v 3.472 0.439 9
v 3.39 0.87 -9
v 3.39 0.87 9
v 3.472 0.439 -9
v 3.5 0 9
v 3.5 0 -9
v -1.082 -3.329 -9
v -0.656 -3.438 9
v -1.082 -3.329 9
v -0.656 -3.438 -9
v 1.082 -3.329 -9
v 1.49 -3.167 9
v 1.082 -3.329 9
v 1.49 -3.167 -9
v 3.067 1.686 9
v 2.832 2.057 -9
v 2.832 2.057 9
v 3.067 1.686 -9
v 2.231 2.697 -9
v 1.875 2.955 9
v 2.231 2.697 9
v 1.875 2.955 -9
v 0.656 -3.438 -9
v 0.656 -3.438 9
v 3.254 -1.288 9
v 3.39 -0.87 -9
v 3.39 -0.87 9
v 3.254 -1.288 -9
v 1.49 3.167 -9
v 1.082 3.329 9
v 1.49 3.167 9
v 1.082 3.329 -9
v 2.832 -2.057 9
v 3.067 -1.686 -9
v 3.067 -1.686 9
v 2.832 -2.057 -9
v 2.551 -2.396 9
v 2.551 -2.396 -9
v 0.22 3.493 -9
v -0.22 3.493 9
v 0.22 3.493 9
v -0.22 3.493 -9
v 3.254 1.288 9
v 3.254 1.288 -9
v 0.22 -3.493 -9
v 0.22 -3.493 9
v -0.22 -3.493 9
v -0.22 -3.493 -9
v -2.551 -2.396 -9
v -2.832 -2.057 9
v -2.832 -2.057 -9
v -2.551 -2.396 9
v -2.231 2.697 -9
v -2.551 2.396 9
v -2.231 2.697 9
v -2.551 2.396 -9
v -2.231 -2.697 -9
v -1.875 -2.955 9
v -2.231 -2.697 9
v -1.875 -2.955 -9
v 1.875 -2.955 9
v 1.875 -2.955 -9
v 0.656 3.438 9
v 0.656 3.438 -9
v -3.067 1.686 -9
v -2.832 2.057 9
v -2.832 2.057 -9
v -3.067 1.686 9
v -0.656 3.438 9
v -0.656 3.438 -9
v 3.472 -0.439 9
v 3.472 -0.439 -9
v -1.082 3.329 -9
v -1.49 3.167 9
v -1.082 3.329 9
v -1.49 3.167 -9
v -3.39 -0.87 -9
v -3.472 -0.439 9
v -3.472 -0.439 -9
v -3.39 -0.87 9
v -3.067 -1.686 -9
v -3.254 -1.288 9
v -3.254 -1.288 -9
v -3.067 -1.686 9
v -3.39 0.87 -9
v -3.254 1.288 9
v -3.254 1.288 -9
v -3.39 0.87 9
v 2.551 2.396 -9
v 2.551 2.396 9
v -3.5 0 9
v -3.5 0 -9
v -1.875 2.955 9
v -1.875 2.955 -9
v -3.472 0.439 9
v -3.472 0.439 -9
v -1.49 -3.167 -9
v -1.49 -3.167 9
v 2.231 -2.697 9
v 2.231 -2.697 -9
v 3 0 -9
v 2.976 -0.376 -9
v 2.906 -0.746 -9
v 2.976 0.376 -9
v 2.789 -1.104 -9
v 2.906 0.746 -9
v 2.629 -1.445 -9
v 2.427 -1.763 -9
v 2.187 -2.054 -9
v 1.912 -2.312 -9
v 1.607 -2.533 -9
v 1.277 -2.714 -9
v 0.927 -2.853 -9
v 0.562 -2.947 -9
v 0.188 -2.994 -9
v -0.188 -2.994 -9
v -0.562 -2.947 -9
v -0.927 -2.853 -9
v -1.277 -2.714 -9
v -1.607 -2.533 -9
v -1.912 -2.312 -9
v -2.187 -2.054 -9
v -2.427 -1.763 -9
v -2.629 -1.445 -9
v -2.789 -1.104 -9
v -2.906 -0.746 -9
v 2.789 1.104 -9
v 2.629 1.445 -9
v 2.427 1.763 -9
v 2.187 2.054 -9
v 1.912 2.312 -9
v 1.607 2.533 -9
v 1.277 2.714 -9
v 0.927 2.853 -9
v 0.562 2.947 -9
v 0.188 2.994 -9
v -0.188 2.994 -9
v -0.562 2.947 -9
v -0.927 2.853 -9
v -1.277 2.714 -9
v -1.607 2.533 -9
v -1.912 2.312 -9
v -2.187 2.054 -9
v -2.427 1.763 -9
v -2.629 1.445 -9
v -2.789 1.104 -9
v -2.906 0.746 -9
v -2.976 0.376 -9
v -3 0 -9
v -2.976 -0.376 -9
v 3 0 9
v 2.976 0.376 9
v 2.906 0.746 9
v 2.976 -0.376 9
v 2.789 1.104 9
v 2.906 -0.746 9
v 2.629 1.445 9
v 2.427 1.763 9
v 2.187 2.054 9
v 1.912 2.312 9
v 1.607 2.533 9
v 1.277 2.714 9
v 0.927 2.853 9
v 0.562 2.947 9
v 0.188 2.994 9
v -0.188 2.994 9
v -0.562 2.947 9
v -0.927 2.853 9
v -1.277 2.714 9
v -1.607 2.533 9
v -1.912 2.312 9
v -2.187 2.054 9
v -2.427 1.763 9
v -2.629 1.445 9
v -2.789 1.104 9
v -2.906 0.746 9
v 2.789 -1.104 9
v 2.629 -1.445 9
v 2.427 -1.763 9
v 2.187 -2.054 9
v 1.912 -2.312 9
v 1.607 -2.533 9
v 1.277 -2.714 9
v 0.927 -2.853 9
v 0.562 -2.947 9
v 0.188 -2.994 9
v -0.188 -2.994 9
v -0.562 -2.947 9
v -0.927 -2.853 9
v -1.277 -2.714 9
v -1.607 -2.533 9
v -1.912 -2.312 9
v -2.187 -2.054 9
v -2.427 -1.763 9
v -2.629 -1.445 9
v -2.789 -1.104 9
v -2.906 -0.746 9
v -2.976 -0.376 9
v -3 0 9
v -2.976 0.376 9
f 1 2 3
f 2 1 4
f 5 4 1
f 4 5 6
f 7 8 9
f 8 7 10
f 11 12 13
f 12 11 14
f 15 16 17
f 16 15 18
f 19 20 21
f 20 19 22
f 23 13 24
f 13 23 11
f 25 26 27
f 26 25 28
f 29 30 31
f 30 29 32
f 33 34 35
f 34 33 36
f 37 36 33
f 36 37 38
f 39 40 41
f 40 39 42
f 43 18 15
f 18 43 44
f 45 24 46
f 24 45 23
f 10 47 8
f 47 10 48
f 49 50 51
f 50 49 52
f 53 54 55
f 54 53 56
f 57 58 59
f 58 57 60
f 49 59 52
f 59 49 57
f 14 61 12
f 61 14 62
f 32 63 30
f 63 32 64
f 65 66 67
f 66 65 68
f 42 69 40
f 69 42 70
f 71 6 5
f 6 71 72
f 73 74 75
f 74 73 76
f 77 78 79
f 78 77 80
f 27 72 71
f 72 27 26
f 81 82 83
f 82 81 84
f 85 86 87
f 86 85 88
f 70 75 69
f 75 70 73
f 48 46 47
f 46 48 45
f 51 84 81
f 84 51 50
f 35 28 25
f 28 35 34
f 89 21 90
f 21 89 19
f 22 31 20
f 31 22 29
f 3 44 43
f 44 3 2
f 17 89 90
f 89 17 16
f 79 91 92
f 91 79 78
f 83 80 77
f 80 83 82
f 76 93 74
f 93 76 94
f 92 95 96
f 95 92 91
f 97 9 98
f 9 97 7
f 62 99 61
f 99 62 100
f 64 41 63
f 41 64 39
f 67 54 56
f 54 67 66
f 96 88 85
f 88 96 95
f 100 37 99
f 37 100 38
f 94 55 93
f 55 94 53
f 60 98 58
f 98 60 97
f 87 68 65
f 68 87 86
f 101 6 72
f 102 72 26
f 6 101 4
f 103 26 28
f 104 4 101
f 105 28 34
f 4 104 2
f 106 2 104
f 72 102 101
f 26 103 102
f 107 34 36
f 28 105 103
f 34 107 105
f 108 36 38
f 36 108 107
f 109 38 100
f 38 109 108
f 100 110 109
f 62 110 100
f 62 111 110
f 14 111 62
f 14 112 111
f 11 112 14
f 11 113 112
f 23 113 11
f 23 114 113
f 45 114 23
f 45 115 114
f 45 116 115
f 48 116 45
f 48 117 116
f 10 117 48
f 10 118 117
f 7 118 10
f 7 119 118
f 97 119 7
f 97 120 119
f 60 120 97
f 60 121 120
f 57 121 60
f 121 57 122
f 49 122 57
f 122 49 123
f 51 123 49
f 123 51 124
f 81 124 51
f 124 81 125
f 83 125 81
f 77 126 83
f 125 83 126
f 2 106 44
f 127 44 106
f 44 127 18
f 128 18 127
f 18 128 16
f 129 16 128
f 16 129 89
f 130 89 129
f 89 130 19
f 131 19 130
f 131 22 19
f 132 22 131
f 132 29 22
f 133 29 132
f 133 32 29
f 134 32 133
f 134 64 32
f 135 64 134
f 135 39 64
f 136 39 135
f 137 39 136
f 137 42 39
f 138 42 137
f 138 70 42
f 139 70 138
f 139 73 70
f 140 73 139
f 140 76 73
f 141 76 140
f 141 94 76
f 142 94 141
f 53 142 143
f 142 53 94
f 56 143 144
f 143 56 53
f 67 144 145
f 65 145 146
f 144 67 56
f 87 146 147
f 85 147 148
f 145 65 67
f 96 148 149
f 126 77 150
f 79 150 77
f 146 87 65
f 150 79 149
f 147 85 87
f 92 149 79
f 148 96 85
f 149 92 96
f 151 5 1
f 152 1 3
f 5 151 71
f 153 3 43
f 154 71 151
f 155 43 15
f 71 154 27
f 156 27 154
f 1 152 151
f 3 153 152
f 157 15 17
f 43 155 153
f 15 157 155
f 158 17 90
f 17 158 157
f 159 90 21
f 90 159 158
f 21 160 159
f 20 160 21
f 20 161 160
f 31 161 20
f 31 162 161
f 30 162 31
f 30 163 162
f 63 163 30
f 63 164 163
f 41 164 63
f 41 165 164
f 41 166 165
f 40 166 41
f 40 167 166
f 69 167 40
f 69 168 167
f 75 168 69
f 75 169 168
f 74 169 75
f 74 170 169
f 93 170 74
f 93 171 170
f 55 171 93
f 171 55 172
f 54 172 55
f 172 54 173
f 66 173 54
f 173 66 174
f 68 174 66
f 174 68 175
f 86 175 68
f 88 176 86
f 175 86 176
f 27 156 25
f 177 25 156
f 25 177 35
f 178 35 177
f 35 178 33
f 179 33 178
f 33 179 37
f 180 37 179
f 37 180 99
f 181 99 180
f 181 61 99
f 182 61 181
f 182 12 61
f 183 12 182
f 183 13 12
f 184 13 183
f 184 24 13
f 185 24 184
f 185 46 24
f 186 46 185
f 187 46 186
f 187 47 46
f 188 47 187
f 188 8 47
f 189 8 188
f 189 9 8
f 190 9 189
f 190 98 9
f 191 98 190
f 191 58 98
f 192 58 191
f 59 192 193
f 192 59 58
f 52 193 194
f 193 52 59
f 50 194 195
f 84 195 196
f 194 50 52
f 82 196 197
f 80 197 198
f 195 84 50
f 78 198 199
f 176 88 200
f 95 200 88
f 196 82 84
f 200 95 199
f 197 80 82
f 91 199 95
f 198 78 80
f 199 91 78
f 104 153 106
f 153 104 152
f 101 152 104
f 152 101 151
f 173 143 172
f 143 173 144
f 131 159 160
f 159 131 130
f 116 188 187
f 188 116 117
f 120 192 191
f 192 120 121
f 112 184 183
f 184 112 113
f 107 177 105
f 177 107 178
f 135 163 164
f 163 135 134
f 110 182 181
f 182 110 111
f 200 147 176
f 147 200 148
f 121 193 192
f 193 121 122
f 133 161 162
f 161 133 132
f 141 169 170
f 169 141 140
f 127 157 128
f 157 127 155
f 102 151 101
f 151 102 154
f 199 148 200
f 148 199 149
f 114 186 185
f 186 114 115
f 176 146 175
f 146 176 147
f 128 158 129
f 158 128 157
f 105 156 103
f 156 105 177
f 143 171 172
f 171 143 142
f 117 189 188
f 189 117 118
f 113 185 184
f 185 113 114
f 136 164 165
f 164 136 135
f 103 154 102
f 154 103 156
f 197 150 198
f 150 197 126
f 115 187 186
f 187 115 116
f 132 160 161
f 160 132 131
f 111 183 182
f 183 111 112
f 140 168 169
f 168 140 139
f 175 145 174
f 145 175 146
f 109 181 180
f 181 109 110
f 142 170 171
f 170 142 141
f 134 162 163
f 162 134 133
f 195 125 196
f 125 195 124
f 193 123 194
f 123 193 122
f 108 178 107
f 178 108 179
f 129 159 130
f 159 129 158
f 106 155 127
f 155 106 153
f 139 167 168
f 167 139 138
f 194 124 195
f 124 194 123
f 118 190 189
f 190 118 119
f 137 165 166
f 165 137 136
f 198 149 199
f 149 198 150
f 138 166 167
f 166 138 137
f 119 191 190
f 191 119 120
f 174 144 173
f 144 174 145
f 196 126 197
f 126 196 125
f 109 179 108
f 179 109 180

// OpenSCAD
$fn = 50;


difference() {
	union() {
		translate(v = [0, 0, -9.0000000000]) {
			cylinder(h = 18, r = 3.5000000000);
		}
	}
	union() {
		translate(v = [0, 0, -100.0000000000]) {
			cylinder(h = 200, r = 3.0000000000);
		}
	}
}
